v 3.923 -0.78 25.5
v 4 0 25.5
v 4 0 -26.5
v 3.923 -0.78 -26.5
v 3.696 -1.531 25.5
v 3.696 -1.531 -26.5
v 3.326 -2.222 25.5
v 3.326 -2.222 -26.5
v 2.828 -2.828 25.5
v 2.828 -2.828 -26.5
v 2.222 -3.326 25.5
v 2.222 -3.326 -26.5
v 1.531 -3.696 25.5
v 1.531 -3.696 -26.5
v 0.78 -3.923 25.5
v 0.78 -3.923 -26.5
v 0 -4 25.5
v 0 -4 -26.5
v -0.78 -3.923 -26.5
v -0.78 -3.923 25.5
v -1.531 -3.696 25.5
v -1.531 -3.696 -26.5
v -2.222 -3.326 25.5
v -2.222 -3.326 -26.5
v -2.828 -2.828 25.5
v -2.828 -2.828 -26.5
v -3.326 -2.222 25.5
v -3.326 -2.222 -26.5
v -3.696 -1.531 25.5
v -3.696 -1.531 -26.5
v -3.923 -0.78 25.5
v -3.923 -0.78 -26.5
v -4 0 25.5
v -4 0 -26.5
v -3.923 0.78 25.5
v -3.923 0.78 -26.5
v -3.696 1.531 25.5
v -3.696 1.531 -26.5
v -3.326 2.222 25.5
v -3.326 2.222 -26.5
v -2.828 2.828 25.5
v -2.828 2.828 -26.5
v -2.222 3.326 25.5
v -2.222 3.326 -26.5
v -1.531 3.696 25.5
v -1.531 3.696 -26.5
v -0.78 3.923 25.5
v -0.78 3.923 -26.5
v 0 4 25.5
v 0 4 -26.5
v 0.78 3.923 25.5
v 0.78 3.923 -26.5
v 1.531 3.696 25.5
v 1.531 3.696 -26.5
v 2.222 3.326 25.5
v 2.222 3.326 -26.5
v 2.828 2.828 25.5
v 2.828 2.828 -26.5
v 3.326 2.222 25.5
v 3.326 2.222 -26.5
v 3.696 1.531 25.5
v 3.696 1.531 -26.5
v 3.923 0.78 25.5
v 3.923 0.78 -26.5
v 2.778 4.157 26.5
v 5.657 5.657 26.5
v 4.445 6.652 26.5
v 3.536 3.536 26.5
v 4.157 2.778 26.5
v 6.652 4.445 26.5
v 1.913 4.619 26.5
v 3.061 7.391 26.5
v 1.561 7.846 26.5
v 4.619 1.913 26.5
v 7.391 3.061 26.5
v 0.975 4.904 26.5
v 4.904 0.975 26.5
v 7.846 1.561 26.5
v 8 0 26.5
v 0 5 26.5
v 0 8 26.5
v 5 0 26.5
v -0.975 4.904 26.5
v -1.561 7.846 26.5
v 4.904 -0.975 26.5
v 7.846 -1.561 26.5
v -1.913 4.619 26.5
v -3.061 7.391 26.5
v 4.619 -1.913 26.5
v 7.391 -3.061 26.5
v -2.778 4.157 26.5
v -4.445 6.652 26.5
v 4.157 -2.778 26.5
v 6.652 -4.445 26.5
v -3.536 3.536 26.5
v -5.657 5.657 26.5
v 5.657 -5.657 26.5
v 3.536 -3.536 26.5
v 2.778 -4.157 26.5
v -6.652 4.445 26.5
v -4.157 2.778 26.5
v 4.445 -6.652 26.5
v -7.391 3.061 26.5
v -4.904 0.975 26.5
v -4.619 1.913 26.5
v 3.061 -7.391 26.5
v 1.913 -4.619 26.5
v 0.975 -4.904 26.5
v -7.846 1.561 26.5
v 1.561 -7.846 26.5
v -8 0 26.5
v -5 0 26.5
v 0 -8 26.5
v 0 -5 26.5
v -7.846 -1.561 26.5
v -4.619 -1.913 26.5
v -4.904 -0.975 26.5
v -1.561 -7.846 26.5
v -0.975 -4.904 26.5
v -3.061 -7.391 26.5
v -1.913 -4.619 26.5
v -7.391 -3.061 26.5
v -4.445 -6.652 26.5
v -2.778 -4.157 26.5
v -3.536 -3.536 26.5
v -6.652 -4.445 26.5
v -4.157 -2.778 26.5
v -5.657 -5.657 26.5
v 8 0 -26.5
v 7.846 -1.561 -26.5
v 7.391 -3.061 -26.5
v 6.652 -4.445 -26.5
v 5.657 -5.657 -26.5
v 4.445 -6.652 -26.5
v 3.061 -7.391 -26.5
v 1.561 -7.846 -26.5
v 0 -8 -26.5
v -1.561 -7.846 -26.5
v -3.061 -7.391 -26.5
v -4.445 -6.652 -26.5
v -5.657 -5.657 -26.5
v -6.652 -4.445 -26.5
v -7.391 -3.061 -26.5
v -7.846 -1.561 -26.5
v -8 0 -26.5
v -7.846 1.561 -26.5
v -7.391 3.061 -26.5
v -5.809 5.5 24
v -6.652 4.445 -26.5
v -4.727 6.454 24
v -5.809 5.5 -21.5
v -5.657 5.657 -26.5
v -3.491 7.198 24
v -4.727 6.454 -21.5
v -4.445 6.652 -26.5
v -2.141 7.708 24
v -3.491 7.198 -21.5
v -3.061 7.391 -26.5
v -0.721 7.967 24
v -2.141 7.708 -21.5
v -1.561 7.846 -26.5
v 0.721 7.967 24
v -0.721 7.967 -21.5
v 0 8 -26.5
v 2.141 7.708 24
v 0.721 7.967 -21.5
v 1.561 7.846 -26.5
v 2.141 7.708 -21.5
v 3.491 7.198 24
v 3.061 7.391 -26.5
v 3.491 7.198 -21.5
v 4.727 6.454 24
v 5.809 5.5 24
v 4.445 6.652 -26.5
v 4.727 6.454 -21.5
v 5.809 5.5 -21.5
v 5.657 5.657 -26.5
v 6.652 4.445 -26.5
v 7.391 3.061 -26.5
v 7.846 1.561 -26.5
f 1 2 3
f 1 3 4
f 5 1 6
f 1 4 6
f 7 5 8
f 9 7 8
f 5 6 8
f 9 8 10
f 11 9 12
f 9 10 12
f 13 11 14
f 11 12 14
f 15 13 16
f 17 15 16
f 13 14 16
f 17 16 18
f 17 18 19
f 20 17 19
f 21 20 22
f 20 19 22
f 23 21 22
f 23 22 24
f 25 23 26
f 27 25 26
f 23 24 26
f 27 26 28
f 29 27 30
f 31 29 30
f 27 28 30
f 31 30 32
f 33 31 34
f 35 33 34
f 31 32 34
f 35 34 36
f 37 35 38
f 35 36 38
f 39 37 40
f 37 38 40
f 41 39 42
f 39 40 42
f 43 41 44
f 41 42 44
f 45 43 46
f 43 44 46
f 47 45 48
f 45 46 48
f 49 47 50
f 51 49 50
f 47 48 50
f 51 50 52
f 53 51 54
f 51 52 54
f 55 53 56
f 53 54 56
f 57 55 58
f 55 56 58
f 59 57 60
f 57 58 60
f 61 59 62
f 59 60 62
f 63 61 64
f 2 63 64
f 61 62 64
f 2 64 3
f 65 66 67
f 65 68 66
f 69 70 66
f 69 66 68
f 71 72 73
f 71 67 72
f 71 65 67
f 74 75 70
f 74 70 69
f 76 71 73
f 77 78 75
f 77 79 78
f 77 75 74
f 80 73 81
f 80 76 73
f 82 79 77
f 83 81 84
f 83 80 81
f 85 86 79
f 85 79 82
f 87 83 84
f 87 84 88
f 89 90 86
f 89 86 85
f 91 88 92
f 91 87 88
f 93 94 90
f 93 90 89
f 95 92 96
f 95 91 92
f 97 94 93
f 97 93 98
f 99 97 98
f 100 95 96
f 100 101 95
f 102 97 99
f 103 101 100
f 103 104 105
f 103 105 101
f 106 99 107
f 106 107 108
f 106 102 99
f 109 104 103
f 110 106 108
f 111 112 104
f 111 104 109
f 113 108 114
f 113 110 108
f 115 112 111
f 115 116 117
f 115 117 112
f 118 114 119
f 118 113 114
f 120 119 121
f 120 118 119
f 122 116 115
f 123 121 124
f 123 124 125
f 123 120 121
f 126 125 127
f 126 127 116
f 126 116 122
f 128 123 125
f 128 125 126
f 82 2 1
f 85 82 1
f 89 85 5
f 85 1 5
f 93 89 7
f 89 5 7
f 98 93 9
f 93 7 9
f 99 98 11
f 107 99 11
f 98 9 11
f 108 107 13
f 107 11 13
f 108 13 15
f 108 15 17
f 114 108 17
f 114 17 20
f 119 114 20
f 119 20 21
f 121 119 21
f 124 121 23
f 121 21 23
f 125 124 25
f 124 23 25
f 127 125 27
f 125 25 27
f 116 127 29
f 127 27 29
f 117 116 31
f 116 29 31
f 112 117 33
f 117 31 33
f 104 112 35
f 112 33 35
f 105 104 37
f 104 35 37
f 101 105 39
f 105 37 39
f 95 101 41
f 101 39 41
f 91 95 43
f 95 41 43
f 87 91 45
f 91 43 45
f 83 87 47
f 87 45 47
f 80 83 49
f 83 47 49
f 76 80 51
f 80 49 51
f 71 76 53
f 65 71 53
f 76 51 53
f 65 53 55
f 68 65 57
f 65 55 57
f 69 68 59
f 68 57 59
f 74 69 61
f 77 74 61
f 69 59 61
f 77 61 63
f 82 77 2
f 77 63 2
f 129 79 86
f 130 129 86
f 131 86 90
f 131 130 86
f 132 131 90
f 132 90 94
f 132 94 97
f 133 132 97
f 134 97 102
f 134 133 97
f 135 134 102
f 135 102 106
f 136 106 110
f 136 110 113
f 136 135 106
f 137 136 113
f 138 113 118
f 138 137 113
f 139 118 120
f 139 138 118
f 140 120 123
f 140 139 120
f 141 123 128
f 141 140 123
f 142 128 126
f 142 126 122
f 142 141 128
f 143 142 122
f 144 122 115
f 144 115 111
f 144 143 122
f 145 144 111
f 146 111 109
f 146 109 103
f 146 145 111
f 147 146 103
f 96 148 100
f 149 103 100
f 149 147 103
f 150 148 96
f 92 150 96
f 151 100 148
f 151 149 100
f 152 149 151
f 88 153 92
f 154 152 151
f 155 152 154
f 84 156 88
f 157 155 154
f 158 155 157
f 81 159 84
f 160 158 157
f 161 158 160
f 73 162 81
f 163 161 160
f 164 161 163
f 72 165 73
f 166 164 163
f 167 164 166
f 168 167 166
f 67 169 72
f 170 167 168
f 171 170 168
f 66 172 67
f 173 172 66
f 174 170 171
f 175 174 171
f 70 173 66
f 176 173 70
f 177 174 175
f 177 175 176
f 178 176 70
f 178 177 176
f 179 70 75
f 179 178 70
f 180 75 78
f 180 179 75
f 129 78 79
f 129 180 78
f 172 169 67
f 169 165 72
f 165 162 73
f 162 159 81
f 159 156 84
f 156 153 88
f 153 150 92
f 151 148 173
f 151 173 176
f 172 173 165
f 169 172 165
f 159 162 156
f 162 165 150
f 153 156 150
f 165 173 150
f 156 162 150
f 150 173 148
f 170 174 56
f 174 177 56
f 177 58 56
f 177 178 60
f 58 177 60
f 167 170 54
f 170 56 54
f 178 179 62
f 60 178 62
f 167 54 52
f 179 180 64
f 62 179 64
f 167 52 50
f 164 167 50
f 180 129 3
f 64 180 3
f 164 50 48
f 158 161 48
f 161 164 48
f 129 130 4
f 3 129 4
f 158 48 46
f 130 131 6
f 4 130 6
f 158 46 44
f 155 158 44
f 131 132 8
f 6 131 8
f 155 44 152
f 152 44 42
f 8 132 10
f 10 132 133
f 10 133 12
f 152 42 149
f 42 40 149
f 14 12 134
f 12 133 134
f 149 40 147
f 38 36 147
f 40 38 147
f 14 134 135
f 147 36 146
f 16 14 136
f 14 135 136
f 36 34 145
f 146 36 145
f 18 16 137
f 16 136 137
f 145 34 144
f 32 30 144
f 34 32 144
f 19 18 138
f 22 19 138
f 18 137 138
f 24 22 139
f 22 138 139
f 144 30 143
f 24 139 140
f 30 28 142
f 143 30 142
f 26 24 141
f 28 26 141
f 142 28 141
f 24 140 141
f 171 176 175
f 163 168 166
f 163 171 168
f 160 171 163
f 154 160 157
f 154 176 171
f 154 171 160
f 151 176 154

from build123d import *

# Parameters (mm, degrees)
CROQUIS1_W                 = 53
CROQUIS1_H                 = 4
CHAFL_N1_SIZE              = 1
CORTAR_EXTRUIR1_DEPTH      = 29.814059068
CORTAR_EXTRUIR1_DEPTH_BACK = 29.814059068
CROQUIS2_W                 = 45.5
CROQUIS2_H                 = 2.5


with BuildPart() as part:
    # Croquis1 → Revolución1 (revolve)
    with BuildSketch(Plane(origin=(0, 0, 0), x_dir=(0, 0, -1), z_dir=(1, 0, 0)), mode=Mode.PRIVATE) as revoluci_n1_sk:
        with Locations((0, 6)):
            Rectangle(CROQUIS1_W, CROQUIS1_H)
    revolve(revoluci_n1_sk.sketch.rotate(Axis((0, 0, 35.899159664), (0, 0, -1)), 90), axis=Axis((0, 0, 35.899159664), (0, 0, -1)))

    # Chaflán1
    chafl_n1_edges = [part.edges().sort_by_distance(p)[0] for p in [
        (-4, 0, 26.5),
    ]]
    chamfer(chafl_n1_edges, length=CHAFL_N1_SIZE)

    # Croquis2 → Cortar-Extruir1 (cut, two sides: drawn at the far end of the back side and taken through both)
    with BuildSketch(Plane(origin=(0, 0, 0), x_dir=(0, 0, -1), z_dir=(1, 0, 0)).offset(-CORTAR_EXTRUIR1_DEPTH_BACK)):
        with Locations((-1.25, 6.75)):
            Rectangle(CROQUIS2_W, CROQUIS2_H)
    extrude(amount=CORTAR_EXTRUIR1_DEPTH + CORTAR_EXTRUIR1_DEPTH_BACK, mode=Mode.SUBTRACT)


solid = part.part
